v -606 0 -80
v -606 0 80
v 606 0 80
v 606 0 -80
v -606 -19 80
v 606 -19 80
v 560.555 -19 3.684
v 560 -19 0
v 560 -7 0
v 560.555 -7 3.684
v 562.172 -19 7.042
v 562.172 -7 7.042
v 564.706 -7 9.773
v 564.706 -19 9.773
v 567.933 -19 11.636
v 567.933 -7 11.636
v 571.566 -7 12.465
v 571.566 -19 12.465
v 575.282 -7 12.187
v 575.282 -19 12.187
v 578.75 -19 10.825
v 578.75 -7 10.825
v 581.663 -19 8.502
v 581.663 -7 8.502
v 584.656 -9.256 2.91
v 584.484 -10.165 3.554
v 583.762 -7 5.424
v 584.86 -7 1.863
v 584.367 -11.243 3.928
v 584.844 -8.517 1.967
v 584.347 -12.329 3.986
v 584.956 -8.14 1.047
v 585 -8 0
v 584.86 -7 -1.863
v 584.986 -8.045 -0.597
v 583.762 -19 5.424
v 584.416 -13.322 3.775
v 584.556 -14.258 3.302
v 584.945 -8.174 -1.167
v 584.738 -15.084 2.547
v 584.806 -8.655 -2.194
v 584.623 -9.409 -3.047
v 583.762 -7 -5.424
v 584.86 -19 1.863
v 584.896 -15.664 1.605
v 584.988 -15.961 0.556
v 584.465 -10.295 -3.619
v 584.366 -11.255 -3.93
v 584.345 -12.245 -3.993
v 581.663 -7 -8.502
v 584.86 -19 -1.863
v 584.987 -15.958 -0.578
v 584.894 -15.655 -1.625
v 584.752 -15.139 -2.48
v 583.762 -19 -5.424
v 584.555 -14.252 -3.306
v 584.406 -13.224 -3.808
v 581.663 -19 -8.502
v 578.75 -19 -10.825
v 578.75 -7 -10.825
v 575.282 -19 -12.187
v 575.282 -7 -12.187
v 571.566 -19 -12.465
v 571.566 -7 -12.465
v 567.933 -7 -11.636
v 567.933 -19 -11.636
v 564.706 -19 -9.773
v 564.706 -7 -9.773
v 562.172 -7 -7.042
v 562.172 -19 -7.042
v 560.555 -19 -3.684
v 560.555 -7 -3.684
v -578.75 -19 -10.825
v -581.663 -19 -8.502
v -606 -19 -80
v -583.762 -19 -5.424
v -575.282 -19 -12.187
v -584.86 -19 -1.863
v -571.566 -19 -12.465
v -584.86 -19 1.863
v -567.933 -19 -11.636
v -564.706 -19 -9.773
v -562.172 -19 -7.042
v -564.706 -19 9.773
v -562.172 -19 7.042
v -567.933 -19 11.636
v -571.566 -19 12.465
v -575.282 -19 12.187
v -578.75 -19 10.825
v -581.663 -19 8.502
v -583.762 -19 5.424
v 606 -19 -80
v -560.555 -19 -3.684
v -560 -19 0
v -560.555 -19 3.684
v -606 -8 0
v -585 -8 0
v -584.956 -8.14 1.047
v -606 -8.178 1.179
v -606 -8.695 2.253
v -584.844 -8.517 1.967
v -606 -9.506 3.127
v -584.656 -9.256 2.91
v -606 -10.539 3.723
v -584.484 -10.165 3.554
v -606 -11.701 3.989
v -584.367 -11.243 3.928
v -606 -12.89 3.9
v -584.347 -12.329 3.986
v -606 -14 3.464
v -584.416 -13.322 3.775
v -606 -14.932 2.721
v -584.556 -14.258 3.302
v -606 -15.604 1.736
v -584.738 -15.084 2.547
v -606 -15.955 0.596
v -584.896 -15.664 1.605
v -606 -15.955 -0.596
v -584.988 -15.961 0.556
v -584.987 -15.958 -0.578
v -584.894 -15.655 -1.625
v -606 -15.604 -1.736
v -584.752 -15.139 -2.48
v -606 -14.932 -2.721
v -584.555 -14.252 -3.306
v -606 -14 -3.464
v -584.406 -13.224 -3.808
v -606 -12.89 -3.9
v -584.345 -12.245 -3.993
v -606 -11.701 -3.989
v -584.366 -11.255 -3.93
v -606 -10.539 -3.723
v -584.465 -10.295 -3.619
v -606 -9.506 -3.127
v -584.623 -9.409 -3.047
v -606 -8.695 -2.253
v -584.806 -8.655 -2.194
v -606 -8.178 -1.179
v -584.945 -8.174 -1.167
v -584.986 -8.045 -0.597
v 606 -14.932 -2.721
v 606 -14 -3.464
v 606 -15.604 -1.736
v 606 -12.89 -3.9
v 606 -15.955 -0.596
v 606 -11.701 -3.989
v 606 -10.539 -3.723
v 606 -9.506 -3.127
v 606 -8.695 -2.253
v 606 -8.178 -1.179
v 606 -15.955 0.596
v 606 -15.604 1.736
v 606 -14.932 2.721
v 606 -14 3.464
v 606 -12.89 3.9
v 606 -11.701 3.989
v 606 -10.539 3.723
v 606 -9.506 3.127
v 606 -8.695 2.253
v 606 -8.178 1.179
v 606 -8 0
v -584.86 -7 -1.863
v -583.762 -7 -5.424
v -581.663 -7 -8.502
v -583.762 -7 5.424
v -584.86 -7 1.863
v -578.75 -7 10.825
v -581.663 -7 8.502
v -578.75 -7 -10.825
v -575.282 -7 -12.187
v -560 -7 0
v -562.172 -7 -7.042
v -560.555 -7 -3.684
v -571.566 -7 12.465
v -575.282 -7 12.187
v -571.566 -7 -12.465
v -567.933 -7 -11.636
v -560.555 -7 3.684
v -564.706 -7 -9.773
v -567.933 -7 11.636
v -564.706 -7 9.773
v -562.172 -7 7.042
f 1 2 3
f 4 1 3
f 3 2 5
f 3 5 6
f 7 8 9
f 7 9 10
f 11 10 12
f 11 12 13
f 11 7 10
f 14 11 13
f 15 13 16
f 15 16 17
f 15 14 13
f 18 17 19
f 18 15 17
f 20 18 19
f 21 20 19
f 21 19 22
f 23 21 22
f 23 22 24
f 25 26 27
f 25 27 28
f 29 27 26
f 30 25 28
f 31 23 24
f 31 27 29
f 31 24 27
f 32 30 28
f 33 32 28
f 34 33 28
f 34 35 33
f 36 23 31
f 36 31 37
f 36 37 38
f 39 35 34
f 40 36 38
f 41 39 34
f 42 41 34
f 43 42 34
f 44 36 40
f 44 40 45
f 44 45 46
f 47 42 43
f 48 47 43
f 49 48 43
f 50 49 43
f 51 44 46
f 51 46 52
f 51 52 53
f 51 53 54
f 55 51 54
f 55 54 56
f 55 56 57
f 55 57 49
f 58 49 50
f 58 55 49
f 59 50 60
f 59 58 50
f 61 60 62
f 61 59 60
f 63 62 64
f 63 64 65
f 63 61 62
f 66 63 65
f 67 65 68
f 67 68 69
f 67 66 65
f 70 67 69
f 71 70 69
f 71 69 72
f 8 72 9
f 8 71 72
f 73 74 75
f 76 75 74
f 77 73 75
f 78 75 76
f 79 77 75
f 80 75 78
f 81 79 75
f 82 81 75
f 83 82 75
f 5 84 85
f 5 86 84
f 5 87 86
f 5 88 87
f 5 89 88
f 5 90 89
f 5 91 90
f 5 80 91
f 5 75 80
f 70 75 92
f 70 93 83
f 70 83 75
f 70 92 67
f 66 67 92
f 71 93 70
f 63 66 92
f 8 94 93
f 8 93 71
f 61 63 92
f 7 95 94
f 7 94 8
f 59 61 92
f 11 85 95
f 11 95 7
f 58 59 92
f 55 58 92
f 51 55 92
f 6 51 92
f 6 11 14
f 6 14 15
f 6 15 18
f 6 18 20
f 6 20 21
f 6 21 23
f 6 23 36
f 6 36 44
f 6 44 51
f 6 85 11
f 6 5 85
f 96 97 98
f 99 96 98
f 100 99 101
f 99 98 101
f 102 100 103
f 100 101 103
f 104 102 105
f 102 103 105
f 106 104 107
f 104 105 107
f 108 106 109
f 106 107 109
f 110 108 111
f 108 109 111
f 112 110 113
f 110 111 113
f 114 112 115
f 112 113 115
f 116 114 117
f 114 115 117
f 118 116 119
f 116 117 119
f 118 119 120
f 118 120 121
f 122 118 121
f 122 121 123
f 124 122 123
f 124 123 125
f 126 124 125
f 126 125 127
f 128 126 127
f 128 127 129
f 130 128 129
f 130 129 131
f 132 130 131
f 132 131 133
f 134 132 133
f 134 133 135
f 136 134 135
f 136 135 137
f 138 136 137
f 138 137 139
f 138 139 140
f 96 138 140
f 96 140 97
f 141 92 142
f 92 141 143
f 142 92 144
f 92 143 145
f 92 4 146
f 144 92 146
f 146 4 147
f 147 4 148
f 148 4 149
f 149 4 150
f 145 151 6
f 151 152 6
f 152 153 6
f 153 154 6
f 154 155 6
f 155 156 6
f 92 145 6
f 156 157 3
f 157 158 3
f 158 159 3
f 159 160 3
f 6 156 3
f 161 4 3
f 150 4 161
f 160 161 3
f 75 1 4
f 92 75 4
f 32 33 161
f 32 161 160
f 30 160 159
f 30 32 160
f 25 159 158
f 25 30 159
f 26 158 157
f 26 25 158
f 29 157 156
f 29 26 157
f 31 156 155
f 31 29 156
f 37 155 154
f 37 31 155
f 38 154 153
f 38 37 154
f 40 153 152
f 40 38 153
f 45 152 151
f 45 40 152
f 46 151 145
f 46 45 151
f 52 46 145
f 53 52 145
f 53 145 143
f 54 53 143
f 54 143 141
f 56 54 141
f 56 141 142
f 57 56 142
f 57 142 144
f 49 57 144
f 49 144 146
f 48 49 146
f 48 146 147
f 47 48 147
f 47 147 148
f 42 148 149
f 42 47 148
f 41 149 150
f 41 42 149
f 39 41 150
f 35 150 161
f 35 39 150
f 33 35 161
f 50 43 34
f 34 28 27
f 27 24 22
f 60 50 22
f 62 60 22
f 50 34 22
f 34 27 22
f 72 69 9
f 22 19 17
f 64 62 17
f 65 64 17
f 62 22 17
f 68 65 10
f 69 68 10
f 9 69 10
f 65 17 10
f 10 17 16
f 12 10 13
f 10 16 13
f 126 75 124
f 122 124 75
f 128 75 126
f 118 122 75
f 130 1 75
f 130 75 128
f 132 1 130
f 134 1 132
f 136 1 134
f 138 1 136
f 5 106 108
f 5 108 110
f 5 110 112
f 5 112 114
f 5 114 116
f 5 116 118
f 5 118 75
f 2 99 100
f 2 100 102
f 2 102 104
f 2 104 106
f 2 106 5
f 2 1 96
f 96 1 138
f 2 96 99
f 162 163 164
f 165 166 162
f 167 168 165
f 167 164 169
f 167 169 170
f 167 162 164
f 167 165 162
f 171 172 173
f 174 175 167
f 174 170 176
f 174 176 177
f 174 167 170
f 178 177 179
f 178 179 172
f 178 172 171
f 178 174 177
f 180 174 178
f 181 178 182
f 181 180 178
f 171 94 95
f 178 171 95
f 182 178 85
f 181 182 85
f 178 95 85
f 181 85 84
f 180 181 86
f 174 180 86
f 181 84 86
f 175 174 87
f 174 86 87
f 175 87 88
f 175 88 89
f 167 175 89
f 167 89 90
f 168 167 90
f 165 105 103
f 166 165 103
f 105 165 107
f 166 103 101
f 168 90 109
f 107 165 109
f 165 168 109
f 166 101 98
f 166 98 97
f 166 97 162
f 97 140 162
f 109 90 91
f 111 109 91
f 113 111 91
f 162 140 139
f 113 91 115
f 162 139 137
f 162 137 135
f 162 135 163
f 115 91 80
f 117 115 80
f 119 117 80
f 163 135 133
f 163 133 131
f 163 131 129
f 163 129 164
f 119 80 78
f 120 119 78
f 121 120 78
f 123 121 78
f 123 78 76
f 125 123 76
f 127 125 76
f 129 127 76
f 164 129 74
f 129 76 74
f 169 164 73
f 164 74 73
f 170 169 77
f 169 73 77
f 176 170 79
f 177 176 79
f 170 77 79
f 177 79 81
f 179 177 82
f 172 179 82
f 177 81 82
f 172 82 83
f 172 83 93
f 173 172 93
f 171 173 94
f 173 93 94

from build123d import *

# Parameters (mm, degrees)
F0_W     = 1212
F0_H     = 160
F1_DEPTH = 19
F2_R     = 12.5
F3_DEPTH = 12
F5_D     = 8
F5_DEPTH = 22
F5_TIP   = 2.4034424761


# Not quite as in the source:
# - a pattern or mirror of a feature is missing from the dataset's text; its kind, count and spacing are read off the source's solid


with BuildPart() as f1:
    # F0 (on Front) → F1 (new body)
    with BuildSketch(Plane.XZ):
        Rectangle(F0_W, F0_H)
    extrude(amount=F1_DEPTH)

    # F2 (on face) → F3 (cut)
    with BuildSketch(Plane.XZ.offset(19)):
        with Locations((-572.5, 0)):
            Circle(F2_R)
    f3 = extrude(amount=-F3_DEPTH, mode=Mode.SUBTRACT)

    # F3_copies: F3 across plane
    add(f3.mirror(Plane(origin=(0, 0, 0), x_dir=(0, 0, 1), z_dir=(1, 0, 0))), mode=Mode.SUBTRACT)

    # F5
    with Locations(Plane(origin=(-606, 0, 0), x_dir=(0, -1, 0), z_dir=(-1, 0, 0))):
        with Locations((12, 0)):
            f5 = Hole(F5_D / 2, depth=F5_DEPTH)
            with Locations((0, 0, -(F5_DEPTH + F5_TIP / 2))):  # 118° drill point
                Cone(0, F5_D / 2, F5_TIP, mode=Mode.SUBTRACT)

    # F5_copies: F5 across plane
    add(f5.mirror(Plane(origin=(3.5e-05, 0, 0), x_dir=(0, 0, 1), z_dir=(1, 0, 0))), mode=Mode.SUBTRACT)


solid = f1.part
